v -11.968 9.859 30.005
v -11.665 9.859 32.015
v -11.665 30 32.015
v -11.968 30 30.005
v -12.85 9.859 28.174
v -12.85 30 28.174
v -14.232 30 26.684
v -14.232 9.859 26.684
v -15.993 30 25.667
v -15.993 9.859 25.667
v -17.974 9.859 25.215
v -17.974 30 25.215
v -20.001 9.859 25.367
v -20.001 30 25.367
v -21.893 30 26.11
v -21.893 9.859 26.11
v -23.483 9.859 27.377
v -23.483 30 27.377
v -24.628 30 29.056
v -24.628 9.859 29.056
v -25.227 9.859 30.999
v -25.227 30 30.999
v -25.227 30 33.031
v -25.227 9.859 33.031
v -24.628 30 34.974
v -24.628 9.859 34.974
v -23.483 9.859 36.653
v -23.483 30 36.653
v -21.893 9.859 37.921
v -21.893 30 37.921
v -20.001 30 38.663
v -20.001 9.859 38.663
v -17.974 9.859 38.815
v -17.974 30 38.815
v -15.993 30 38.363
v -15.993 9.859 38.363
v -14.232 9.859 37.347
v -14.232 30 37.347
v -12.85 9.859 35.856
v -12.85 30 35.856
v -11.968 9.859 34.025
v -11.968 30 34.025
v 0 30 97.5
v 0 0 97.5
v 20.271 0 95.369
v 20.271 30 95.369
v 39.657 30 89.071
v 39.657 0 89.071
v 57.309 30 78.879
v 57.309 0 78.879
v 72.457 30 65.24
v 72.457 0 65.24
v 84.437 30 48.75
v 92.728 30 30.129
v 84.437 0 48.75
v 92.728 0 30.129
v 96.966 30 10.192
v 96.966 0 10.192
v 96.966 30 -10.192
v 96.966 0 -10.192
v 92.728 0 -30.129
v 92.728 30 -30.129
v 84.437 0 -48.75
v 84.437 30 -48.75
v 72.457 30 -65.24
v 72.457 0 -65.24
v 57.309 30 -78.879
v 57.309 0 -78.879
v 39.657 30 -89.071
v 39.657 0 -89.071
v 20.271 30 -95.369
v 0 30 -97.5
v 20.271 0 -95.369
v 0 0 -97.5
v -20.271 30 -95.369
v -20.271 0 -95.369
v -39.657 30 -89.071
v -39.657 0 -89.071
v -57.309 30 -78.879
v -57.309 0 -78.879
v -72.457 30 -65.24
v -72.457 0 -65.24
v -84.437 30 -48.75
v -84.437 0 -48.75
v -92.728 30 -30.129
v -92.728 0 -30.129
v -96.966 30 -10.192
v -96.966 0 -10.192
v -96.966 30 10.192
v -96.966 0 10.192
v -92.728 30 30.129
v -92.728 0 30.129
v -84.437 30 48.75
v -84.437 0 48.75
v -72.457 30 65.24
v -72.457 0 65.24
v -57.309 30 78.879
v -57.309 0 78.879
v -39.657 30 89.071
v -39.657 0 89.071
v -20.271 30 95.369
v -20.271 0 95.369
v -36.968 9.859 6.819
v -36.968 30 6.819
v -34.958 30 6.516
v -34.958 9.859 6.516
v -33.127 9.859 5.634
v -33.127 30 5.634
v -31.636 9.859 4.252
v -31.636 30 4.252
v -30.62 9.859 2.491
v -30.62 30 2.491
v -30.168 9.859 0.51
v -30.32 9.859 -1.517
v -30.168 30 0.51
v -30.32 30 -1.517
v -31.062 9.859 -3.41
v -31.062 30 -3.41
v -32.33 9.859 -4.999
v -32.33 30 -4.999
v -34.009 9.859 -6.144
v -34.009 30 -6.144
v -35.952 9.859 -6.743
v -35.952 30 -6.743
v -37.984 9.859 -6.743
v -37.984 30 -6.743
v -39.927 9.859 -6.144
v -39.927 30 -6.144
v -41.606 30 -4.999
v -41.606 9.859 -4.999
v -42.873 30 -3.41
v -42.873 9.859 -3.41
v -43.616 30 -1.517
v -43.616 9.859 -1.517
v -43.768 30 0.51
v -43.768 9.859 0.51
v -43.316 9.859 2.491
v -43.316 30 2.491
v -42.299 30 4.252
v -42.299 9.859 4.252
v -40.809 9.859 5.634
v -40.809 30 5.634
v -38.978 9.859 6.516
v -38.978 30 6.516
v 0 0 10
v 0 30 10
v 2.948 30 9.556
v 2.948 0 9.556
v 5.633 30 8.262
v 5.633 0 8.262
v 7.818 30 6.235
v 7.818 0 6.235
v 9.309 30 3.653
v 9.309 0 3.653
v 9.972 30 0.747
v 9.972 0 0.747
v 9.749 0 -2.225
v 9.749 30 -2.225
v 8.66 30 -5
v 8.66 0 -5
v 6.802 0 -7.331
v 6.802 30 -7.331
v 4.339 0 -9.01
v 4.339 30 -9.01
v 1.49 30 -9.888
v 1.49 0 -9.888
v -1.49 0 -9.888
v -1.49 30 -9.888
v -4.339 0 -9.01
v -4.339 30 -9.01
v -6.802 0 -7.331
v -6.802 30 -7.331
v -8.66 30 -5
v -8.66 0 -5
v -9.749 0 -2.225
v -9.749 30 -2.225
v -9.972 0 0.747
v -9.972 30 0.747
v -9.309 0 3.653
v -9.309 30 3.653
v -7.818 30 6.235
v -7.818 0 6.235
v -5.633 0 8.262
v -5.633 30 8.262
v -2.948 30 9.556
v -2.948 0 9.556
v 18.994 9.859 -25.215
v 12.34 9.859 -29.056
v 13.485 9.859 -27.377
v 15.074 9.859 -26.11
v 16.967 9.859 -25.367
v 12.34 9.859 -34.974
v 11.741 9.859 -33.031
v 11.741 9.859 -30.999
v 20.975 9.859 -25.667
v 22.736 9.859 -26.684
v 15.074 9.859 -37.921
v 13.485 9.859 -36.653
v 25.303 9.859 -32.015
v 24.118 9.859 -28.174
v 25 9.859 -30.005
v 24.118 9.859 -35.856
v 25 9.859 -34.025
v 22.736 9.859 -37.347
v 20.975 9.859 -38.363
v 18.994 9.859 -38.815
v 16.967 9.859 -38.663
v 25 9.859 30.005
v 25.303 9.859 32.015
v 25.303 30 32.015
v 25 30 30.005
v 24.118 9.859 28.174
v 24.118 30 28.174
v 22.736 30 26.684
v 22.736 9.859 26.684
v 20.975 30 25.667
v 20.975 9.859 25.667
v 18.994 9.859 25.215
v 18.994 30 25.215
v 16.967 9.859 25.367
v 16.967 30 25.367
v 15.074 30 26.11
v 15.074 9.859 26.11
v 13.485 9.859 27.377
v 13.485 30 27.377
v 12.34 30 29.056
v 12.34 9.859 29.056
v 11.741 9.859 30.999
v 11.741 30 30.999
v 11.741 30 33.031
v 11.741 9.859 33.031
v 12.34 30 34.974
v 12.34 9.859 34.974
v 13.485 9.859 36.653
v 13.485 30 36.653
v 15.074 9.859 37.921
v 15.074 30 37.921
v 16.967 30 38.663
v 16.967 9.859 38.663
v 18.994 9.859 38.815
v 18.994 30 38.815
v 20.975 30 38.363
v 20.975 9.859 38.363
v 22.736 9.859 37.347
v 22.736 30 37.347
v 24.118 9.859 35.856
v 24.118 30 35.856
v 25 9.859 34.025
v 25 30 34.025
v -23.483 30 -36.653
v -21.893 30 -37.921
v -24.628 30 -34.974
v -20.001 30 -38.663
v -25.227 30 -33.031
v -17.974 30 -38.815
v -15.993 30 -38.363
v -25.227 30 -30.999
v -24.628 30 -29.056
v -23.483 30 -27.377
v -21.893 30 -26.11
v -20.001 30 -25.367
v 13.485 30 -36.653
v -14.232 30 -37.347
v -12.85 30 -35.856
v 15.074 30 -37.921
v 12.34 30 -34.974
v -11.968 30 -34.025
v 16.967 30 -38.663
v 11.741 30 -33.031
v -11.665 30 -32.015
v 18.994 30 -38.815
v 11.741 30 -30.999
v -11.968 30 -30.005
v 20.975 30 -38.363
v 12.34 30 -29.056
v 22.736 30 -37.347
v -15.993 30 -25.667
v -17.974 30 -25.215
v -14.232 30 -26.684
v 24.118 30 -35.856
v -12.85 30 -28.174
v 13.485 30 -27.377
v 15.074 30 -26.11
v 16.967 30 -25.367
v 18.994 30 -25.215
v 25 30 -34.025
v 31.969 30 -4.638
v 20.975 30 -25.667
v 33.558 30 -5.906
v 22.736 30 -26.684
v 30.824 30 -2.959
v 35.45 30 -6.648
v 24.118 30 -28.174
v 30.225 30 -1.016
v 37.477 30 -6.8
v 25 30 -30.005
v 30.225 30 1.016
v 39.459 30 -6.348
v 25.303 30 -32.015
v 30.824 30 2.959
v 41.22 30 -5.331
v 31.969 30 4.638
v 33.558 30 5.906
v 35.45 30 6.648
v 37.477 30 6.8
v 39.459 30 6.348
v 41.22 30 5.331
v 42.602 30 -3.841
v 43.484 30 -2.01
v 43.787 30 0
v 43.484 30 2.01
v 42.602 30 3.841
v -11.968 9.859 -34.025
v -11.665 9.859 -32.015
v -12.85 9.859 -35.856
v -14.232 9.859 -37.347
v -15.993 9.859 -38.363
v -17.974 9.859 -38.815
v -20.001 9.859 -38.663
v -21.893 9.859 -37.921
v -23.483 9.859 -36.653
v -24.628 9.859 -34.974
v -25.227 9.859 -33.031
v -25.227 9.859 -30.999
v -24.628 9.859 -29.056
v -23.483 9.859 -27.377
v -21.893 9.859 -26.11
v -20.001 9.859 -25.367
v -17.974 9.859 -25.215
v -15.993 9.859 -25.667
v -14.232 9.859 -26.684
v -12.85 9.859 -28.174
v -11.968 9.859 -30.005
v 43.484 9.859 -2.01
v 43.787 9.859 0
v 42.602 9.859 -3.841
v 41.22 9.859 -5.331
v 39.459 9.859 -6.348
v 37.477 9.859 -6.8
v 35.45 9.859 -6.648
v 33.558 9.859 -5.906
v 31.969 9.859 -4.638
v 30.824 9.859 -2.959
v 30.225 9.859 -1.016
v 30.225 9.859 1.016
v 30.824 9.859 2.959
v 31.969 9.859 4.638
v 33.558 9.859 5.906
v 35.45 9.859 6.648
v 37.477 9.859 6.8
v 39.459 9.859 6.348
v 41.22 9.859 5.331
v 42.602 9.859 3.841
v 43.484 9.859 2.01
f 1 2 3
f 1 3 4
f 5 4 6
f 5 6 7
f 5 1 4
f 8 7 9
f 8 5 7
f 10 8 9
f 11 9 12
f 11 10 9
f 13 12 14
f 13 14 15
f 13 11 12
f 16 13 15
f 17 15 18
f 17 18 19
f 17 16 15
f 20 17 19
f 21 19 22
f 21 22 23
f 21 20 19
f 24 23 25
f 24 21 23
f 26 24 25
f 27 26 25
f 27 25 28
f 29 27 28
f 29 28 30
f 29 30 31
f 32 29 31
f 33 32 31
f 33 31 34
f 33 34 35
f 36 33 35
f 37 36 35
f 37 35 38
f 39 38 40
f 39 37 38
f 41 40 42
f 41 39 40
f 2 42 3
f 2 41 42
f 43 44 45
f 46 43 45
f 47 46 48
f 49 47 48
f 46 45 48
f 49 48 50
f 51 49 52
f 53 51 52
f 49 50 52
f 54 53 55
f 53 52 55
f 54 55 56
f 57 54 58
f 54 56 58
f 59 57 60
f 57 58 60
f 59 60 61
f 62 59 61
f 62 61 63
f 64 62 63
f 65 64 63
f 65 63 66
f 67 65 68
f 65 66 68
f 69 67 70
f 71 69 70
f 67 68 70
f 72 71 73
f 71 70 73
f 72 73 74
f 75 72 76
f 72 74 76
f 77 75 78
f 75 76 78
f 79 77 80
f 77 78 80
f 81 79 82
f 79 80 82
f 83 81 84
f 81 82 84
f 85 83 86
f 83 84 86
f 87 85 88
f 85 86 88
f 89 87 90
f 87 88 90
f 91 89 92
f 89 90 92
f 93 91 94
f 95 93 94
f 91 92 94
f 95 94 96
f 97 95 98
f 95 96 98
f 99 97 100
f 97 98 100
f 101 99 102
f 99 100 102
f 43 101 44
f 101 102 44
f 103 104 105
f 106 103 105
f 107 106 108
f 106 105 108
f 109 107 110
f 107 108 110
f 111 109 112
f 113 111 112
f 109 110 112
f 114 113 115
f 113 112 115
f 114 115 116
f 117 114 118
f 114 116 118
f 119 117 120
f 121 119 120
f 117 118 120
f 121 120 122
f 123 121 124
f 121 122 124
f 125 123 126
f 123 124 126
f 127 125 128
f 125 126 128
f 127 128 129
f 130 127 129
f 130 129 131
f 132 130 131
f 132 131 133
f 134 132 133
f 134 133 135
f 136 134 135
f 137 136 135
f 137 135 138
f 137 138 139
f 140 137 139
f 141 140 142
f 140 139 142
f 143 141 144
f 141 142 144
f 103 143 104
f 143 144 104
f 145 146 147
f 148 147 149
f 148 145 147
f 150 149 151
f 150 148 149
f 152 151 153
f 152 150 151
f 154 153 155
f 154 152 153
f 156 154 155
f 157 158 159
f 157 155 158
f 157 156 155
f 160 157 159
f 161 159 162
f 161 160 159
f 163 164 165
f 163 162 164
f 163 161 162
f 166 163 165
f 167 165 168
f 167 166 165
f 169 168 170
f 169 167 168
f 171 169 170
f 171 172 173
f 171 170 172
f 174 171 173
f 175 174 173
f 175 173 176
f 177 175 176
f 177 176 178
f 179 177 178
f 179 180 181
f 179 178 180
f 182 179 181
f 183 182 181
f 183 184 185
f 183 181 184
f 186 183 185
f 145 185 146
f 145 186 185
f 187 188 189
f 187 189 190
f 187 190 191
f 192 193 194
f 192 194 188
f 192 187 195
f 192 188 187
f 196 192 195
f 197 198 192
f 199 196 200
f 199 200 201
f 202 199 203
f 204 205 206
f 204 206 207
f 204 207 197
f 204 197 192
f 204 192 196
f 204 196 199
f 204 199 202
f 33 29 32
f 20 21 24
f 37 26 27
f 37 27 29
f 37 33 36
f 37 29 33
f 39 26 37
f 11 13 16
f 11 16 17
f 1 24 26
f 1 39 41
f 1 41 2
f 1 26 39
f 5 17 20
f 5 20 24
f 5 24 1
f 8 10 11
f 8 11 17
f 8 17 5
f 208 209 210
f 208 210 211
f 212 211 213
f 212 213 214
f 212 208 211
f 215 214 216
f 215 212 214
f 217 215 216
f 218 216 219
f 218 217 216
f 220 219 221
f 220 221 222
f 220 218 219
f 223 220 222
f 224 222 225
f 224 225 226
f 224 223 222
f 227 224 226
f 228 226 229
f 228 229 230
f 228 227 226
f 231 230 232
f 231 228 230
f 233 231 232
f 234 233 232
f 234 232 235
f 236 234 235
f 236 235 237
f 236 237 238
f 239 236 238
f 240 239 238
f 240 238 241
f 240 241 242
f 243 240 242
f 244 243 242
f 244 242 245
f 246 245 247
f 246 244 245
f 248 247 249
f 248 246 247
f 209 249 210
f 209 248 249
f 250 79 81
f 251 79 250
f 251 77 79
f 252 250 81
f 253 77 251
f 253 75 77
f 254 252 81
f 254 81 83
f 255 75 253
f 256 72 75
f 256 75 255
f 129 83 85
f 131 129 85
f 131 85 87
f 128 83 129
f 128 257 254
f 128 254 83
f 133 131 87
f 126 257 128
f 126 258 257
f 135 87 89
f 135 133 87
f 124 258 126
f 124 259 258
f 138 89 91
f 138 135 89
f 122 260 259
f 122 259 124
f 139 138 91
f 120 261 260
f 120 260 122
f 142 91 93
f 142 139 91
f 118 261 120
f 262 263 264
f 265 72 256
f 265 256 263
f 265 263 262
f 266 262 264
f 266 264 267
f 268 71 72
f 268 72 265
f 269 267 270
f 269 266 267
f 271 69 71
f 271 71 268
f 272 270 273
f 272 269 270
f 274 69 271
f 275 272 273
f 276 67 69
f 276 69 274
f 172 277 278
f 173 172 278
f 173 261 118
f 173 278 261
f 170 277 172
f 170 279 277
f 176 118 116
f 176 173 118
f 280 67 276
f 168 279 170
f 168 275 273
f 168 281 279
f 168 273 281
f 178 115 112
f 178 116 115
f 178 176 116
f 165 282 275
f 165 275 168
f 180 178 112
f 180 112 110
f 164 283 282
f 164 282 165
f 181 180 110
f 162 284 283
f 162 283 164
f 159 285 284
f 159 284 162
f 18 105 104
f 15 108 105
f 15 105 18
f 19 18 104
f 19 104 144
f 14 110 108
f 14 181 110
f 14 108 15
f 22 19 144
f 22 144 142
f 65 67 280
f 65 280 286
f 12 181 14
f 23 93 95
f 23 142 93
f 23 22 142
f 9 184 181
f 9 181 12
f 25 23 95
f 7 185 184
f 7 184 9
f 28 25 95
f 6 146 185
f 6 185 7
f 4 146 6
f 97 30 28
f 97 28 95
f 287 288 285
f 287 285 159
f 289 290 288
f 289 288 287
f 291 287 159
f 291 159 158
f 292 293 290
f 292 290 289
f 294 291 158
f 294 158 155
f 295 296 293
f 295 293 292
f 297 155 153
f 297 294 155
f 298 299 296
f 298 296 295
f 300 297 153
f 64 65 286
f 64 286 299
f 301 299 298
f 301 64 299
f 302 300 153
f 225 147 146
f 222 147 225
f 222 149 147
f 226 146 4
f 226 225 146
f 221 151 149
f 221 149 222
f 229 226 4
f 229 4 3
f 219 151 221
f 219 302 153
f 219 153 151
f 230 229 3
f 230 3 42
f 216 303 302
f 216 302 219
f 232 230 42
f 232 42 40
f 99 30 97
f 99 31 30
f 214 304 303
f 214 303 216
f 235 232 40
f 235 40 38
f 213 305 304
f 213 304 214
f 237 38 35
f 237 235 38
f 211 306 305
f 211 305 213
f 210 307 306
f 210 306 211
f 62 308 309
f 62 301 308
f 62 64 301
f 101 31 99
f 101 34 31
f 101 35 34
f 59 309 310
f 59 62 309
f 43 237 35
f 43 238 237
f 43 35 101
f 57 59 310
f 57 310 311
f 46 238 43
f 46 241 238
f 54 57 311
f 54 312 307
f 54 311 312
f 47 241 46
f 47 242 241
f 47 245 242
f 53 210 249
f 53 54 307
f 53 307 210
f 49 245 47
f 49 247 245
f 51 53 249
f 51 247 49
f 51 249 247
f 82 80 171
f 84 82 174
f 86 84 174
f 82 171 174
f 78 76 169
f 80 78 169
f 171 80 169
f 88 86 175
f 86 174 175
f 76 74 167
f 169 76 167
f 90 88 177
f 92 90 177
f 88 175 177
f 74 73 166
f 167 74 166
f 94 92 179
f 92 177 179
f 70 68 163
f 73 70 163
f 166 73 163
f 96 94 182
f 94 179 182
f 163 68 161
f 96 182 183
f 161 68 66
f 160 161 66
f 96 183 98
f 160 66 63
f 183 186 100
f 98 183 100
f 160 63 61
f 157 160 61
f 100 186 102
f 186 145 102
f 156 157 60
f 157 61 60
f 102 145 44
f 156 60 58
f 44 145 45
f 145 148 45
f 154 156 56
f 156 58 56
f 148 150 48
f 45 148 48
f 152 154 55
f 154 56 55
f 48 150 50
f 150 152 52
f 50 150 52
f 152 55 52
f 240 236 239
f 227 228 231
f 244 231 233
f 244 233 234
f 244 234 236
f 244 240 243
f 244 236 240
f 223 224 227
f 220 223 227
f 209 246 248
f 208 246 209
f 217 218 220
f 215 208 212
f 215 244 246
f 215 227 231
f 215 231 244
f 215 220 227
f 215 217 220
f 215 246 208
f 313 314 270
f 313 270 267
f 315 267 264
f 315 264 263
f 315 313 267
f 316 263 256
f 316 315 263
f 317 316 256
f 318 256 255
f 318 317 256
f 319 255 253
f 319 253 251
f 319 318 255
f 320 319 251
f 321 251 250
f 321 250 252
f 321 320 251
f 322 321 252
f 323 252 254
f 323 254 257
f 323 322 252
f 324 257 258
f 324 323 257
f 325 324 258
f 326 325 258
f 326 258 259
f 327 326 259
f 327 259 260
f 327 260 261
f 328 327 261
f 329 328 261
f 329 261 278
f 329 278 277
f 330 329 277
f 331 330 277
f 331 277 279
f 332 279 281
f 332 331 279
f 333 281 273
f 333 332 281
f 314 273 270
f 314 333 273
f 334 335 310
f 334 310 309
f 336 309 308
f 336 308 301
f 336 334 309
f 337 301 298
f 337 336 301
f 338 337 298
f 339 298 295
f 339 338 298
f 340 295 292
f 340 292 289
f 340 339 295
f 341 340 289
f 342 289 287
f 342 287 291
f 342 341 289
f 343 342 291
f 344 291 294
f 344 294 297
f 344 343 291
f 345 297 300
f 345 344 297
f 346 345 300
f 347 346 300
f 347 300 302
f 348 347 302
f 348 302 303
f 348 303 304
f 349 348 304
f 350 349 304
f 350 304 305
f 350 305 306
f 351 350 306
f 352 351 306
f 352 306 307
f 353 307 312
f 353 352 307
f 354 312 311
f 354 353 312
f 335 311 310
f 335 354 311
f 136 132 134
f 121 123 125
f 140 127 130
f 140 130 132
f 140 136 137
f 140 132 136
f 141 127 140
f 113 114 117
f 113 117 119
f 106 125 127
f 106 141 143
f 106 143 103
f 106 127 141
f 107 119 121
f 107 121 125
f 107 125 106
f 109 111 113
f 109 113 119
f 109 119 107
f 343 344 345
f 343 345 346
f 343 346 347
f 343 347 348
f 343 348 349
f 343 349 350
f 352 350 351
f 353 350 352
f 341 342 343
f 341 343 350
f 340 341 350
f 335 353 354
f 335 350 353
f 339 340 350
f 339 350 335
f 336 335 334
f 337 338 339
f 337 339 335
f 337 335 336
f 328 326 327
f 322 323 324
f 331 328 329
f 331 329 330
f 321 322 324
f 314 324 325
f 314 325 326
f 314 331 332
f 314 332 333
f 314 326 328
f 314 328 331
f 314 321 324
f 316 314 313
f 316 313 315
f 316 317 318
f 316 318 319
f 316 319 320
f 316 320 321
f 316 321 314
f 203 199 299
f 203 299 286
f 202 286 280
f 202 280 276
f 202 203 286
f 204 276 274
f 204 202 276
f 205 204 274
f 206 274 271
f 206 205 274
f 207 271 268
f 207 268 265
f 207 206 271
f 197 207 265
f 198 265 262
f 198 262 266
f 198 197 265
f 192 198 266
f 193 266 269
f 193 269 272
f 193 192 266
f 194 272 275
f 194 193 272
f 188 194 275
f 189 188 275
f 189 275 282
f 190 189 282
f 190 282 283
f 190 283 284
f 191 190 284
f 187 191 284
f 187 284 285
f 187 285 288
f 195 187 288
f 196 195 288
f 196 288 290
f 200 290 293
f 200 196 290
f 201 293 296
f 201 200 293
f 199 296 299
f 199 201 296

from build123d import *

# Parameters (mm, degrees)
SKETCH1_R           = 97.5
BOSS_EXTRUDE1_DEPTH = 30
SKETCH2_R           = 10
CUT_EXTRUDE1_DEPTH  = 142.111657917
SKETCH3_R           = 6.819096127
CUT_EXTRUDE2_DEPTH  = 20.141210853
CIRPATTERN1_COUNT   = 6


with BuildPart() as part:
    # Sketch1 → Boss-Extrude1 (new body)
    with BuildSketch(Plane(origin=(0, 0, 0), x_dir=(1, 0, 0), z_dir=(0, 1, 0))):
        Circle(SKETCH1_R)
    extrude(amount=BOSS_EXTRUDE1_DEPTH)

    # Sketch2 → Cut-Extrude1 (cut, through all)
    with BuildSketch(Plane(origin=(0, 0, 0), x_dir=(1, 0, 0), z_dir=(0, 1, 0))):
        Circle(SKETCH2_R)
    extrude(amount=CUT_EXTRUDE1_DEPTH, mode=Mode.SUBTRACT)

    # Sketch3 → Cut-Extrude2 (cut)
    with BuildSketch(Plane(origin=(0, 30, 0), x_dir=(1, 0, 0), z_dir=(0, 1, 0))):
        with Locations((-36.967875527, 0)):
            Circle(SKETCH3_R)
    cut_extrude2 = extrude(amount=-CUT_EXTRUDE2_DEPTH, mode=Mode.SUBTRACT)

    # CirPattern1: Cut-Extrude2 ×6 about axis
    cirpattern1_axis = Axis((0, 0, 0), (0, 1, 0))
    for i in range(1, CIRPATTERN1_COUNT):
        add(cut_extrude2.rotate(cirpattern1_axis, i * 360 / CIRPATTERN1_COUNT), mode=Mode.SUBTRACT)


solid = part.part
